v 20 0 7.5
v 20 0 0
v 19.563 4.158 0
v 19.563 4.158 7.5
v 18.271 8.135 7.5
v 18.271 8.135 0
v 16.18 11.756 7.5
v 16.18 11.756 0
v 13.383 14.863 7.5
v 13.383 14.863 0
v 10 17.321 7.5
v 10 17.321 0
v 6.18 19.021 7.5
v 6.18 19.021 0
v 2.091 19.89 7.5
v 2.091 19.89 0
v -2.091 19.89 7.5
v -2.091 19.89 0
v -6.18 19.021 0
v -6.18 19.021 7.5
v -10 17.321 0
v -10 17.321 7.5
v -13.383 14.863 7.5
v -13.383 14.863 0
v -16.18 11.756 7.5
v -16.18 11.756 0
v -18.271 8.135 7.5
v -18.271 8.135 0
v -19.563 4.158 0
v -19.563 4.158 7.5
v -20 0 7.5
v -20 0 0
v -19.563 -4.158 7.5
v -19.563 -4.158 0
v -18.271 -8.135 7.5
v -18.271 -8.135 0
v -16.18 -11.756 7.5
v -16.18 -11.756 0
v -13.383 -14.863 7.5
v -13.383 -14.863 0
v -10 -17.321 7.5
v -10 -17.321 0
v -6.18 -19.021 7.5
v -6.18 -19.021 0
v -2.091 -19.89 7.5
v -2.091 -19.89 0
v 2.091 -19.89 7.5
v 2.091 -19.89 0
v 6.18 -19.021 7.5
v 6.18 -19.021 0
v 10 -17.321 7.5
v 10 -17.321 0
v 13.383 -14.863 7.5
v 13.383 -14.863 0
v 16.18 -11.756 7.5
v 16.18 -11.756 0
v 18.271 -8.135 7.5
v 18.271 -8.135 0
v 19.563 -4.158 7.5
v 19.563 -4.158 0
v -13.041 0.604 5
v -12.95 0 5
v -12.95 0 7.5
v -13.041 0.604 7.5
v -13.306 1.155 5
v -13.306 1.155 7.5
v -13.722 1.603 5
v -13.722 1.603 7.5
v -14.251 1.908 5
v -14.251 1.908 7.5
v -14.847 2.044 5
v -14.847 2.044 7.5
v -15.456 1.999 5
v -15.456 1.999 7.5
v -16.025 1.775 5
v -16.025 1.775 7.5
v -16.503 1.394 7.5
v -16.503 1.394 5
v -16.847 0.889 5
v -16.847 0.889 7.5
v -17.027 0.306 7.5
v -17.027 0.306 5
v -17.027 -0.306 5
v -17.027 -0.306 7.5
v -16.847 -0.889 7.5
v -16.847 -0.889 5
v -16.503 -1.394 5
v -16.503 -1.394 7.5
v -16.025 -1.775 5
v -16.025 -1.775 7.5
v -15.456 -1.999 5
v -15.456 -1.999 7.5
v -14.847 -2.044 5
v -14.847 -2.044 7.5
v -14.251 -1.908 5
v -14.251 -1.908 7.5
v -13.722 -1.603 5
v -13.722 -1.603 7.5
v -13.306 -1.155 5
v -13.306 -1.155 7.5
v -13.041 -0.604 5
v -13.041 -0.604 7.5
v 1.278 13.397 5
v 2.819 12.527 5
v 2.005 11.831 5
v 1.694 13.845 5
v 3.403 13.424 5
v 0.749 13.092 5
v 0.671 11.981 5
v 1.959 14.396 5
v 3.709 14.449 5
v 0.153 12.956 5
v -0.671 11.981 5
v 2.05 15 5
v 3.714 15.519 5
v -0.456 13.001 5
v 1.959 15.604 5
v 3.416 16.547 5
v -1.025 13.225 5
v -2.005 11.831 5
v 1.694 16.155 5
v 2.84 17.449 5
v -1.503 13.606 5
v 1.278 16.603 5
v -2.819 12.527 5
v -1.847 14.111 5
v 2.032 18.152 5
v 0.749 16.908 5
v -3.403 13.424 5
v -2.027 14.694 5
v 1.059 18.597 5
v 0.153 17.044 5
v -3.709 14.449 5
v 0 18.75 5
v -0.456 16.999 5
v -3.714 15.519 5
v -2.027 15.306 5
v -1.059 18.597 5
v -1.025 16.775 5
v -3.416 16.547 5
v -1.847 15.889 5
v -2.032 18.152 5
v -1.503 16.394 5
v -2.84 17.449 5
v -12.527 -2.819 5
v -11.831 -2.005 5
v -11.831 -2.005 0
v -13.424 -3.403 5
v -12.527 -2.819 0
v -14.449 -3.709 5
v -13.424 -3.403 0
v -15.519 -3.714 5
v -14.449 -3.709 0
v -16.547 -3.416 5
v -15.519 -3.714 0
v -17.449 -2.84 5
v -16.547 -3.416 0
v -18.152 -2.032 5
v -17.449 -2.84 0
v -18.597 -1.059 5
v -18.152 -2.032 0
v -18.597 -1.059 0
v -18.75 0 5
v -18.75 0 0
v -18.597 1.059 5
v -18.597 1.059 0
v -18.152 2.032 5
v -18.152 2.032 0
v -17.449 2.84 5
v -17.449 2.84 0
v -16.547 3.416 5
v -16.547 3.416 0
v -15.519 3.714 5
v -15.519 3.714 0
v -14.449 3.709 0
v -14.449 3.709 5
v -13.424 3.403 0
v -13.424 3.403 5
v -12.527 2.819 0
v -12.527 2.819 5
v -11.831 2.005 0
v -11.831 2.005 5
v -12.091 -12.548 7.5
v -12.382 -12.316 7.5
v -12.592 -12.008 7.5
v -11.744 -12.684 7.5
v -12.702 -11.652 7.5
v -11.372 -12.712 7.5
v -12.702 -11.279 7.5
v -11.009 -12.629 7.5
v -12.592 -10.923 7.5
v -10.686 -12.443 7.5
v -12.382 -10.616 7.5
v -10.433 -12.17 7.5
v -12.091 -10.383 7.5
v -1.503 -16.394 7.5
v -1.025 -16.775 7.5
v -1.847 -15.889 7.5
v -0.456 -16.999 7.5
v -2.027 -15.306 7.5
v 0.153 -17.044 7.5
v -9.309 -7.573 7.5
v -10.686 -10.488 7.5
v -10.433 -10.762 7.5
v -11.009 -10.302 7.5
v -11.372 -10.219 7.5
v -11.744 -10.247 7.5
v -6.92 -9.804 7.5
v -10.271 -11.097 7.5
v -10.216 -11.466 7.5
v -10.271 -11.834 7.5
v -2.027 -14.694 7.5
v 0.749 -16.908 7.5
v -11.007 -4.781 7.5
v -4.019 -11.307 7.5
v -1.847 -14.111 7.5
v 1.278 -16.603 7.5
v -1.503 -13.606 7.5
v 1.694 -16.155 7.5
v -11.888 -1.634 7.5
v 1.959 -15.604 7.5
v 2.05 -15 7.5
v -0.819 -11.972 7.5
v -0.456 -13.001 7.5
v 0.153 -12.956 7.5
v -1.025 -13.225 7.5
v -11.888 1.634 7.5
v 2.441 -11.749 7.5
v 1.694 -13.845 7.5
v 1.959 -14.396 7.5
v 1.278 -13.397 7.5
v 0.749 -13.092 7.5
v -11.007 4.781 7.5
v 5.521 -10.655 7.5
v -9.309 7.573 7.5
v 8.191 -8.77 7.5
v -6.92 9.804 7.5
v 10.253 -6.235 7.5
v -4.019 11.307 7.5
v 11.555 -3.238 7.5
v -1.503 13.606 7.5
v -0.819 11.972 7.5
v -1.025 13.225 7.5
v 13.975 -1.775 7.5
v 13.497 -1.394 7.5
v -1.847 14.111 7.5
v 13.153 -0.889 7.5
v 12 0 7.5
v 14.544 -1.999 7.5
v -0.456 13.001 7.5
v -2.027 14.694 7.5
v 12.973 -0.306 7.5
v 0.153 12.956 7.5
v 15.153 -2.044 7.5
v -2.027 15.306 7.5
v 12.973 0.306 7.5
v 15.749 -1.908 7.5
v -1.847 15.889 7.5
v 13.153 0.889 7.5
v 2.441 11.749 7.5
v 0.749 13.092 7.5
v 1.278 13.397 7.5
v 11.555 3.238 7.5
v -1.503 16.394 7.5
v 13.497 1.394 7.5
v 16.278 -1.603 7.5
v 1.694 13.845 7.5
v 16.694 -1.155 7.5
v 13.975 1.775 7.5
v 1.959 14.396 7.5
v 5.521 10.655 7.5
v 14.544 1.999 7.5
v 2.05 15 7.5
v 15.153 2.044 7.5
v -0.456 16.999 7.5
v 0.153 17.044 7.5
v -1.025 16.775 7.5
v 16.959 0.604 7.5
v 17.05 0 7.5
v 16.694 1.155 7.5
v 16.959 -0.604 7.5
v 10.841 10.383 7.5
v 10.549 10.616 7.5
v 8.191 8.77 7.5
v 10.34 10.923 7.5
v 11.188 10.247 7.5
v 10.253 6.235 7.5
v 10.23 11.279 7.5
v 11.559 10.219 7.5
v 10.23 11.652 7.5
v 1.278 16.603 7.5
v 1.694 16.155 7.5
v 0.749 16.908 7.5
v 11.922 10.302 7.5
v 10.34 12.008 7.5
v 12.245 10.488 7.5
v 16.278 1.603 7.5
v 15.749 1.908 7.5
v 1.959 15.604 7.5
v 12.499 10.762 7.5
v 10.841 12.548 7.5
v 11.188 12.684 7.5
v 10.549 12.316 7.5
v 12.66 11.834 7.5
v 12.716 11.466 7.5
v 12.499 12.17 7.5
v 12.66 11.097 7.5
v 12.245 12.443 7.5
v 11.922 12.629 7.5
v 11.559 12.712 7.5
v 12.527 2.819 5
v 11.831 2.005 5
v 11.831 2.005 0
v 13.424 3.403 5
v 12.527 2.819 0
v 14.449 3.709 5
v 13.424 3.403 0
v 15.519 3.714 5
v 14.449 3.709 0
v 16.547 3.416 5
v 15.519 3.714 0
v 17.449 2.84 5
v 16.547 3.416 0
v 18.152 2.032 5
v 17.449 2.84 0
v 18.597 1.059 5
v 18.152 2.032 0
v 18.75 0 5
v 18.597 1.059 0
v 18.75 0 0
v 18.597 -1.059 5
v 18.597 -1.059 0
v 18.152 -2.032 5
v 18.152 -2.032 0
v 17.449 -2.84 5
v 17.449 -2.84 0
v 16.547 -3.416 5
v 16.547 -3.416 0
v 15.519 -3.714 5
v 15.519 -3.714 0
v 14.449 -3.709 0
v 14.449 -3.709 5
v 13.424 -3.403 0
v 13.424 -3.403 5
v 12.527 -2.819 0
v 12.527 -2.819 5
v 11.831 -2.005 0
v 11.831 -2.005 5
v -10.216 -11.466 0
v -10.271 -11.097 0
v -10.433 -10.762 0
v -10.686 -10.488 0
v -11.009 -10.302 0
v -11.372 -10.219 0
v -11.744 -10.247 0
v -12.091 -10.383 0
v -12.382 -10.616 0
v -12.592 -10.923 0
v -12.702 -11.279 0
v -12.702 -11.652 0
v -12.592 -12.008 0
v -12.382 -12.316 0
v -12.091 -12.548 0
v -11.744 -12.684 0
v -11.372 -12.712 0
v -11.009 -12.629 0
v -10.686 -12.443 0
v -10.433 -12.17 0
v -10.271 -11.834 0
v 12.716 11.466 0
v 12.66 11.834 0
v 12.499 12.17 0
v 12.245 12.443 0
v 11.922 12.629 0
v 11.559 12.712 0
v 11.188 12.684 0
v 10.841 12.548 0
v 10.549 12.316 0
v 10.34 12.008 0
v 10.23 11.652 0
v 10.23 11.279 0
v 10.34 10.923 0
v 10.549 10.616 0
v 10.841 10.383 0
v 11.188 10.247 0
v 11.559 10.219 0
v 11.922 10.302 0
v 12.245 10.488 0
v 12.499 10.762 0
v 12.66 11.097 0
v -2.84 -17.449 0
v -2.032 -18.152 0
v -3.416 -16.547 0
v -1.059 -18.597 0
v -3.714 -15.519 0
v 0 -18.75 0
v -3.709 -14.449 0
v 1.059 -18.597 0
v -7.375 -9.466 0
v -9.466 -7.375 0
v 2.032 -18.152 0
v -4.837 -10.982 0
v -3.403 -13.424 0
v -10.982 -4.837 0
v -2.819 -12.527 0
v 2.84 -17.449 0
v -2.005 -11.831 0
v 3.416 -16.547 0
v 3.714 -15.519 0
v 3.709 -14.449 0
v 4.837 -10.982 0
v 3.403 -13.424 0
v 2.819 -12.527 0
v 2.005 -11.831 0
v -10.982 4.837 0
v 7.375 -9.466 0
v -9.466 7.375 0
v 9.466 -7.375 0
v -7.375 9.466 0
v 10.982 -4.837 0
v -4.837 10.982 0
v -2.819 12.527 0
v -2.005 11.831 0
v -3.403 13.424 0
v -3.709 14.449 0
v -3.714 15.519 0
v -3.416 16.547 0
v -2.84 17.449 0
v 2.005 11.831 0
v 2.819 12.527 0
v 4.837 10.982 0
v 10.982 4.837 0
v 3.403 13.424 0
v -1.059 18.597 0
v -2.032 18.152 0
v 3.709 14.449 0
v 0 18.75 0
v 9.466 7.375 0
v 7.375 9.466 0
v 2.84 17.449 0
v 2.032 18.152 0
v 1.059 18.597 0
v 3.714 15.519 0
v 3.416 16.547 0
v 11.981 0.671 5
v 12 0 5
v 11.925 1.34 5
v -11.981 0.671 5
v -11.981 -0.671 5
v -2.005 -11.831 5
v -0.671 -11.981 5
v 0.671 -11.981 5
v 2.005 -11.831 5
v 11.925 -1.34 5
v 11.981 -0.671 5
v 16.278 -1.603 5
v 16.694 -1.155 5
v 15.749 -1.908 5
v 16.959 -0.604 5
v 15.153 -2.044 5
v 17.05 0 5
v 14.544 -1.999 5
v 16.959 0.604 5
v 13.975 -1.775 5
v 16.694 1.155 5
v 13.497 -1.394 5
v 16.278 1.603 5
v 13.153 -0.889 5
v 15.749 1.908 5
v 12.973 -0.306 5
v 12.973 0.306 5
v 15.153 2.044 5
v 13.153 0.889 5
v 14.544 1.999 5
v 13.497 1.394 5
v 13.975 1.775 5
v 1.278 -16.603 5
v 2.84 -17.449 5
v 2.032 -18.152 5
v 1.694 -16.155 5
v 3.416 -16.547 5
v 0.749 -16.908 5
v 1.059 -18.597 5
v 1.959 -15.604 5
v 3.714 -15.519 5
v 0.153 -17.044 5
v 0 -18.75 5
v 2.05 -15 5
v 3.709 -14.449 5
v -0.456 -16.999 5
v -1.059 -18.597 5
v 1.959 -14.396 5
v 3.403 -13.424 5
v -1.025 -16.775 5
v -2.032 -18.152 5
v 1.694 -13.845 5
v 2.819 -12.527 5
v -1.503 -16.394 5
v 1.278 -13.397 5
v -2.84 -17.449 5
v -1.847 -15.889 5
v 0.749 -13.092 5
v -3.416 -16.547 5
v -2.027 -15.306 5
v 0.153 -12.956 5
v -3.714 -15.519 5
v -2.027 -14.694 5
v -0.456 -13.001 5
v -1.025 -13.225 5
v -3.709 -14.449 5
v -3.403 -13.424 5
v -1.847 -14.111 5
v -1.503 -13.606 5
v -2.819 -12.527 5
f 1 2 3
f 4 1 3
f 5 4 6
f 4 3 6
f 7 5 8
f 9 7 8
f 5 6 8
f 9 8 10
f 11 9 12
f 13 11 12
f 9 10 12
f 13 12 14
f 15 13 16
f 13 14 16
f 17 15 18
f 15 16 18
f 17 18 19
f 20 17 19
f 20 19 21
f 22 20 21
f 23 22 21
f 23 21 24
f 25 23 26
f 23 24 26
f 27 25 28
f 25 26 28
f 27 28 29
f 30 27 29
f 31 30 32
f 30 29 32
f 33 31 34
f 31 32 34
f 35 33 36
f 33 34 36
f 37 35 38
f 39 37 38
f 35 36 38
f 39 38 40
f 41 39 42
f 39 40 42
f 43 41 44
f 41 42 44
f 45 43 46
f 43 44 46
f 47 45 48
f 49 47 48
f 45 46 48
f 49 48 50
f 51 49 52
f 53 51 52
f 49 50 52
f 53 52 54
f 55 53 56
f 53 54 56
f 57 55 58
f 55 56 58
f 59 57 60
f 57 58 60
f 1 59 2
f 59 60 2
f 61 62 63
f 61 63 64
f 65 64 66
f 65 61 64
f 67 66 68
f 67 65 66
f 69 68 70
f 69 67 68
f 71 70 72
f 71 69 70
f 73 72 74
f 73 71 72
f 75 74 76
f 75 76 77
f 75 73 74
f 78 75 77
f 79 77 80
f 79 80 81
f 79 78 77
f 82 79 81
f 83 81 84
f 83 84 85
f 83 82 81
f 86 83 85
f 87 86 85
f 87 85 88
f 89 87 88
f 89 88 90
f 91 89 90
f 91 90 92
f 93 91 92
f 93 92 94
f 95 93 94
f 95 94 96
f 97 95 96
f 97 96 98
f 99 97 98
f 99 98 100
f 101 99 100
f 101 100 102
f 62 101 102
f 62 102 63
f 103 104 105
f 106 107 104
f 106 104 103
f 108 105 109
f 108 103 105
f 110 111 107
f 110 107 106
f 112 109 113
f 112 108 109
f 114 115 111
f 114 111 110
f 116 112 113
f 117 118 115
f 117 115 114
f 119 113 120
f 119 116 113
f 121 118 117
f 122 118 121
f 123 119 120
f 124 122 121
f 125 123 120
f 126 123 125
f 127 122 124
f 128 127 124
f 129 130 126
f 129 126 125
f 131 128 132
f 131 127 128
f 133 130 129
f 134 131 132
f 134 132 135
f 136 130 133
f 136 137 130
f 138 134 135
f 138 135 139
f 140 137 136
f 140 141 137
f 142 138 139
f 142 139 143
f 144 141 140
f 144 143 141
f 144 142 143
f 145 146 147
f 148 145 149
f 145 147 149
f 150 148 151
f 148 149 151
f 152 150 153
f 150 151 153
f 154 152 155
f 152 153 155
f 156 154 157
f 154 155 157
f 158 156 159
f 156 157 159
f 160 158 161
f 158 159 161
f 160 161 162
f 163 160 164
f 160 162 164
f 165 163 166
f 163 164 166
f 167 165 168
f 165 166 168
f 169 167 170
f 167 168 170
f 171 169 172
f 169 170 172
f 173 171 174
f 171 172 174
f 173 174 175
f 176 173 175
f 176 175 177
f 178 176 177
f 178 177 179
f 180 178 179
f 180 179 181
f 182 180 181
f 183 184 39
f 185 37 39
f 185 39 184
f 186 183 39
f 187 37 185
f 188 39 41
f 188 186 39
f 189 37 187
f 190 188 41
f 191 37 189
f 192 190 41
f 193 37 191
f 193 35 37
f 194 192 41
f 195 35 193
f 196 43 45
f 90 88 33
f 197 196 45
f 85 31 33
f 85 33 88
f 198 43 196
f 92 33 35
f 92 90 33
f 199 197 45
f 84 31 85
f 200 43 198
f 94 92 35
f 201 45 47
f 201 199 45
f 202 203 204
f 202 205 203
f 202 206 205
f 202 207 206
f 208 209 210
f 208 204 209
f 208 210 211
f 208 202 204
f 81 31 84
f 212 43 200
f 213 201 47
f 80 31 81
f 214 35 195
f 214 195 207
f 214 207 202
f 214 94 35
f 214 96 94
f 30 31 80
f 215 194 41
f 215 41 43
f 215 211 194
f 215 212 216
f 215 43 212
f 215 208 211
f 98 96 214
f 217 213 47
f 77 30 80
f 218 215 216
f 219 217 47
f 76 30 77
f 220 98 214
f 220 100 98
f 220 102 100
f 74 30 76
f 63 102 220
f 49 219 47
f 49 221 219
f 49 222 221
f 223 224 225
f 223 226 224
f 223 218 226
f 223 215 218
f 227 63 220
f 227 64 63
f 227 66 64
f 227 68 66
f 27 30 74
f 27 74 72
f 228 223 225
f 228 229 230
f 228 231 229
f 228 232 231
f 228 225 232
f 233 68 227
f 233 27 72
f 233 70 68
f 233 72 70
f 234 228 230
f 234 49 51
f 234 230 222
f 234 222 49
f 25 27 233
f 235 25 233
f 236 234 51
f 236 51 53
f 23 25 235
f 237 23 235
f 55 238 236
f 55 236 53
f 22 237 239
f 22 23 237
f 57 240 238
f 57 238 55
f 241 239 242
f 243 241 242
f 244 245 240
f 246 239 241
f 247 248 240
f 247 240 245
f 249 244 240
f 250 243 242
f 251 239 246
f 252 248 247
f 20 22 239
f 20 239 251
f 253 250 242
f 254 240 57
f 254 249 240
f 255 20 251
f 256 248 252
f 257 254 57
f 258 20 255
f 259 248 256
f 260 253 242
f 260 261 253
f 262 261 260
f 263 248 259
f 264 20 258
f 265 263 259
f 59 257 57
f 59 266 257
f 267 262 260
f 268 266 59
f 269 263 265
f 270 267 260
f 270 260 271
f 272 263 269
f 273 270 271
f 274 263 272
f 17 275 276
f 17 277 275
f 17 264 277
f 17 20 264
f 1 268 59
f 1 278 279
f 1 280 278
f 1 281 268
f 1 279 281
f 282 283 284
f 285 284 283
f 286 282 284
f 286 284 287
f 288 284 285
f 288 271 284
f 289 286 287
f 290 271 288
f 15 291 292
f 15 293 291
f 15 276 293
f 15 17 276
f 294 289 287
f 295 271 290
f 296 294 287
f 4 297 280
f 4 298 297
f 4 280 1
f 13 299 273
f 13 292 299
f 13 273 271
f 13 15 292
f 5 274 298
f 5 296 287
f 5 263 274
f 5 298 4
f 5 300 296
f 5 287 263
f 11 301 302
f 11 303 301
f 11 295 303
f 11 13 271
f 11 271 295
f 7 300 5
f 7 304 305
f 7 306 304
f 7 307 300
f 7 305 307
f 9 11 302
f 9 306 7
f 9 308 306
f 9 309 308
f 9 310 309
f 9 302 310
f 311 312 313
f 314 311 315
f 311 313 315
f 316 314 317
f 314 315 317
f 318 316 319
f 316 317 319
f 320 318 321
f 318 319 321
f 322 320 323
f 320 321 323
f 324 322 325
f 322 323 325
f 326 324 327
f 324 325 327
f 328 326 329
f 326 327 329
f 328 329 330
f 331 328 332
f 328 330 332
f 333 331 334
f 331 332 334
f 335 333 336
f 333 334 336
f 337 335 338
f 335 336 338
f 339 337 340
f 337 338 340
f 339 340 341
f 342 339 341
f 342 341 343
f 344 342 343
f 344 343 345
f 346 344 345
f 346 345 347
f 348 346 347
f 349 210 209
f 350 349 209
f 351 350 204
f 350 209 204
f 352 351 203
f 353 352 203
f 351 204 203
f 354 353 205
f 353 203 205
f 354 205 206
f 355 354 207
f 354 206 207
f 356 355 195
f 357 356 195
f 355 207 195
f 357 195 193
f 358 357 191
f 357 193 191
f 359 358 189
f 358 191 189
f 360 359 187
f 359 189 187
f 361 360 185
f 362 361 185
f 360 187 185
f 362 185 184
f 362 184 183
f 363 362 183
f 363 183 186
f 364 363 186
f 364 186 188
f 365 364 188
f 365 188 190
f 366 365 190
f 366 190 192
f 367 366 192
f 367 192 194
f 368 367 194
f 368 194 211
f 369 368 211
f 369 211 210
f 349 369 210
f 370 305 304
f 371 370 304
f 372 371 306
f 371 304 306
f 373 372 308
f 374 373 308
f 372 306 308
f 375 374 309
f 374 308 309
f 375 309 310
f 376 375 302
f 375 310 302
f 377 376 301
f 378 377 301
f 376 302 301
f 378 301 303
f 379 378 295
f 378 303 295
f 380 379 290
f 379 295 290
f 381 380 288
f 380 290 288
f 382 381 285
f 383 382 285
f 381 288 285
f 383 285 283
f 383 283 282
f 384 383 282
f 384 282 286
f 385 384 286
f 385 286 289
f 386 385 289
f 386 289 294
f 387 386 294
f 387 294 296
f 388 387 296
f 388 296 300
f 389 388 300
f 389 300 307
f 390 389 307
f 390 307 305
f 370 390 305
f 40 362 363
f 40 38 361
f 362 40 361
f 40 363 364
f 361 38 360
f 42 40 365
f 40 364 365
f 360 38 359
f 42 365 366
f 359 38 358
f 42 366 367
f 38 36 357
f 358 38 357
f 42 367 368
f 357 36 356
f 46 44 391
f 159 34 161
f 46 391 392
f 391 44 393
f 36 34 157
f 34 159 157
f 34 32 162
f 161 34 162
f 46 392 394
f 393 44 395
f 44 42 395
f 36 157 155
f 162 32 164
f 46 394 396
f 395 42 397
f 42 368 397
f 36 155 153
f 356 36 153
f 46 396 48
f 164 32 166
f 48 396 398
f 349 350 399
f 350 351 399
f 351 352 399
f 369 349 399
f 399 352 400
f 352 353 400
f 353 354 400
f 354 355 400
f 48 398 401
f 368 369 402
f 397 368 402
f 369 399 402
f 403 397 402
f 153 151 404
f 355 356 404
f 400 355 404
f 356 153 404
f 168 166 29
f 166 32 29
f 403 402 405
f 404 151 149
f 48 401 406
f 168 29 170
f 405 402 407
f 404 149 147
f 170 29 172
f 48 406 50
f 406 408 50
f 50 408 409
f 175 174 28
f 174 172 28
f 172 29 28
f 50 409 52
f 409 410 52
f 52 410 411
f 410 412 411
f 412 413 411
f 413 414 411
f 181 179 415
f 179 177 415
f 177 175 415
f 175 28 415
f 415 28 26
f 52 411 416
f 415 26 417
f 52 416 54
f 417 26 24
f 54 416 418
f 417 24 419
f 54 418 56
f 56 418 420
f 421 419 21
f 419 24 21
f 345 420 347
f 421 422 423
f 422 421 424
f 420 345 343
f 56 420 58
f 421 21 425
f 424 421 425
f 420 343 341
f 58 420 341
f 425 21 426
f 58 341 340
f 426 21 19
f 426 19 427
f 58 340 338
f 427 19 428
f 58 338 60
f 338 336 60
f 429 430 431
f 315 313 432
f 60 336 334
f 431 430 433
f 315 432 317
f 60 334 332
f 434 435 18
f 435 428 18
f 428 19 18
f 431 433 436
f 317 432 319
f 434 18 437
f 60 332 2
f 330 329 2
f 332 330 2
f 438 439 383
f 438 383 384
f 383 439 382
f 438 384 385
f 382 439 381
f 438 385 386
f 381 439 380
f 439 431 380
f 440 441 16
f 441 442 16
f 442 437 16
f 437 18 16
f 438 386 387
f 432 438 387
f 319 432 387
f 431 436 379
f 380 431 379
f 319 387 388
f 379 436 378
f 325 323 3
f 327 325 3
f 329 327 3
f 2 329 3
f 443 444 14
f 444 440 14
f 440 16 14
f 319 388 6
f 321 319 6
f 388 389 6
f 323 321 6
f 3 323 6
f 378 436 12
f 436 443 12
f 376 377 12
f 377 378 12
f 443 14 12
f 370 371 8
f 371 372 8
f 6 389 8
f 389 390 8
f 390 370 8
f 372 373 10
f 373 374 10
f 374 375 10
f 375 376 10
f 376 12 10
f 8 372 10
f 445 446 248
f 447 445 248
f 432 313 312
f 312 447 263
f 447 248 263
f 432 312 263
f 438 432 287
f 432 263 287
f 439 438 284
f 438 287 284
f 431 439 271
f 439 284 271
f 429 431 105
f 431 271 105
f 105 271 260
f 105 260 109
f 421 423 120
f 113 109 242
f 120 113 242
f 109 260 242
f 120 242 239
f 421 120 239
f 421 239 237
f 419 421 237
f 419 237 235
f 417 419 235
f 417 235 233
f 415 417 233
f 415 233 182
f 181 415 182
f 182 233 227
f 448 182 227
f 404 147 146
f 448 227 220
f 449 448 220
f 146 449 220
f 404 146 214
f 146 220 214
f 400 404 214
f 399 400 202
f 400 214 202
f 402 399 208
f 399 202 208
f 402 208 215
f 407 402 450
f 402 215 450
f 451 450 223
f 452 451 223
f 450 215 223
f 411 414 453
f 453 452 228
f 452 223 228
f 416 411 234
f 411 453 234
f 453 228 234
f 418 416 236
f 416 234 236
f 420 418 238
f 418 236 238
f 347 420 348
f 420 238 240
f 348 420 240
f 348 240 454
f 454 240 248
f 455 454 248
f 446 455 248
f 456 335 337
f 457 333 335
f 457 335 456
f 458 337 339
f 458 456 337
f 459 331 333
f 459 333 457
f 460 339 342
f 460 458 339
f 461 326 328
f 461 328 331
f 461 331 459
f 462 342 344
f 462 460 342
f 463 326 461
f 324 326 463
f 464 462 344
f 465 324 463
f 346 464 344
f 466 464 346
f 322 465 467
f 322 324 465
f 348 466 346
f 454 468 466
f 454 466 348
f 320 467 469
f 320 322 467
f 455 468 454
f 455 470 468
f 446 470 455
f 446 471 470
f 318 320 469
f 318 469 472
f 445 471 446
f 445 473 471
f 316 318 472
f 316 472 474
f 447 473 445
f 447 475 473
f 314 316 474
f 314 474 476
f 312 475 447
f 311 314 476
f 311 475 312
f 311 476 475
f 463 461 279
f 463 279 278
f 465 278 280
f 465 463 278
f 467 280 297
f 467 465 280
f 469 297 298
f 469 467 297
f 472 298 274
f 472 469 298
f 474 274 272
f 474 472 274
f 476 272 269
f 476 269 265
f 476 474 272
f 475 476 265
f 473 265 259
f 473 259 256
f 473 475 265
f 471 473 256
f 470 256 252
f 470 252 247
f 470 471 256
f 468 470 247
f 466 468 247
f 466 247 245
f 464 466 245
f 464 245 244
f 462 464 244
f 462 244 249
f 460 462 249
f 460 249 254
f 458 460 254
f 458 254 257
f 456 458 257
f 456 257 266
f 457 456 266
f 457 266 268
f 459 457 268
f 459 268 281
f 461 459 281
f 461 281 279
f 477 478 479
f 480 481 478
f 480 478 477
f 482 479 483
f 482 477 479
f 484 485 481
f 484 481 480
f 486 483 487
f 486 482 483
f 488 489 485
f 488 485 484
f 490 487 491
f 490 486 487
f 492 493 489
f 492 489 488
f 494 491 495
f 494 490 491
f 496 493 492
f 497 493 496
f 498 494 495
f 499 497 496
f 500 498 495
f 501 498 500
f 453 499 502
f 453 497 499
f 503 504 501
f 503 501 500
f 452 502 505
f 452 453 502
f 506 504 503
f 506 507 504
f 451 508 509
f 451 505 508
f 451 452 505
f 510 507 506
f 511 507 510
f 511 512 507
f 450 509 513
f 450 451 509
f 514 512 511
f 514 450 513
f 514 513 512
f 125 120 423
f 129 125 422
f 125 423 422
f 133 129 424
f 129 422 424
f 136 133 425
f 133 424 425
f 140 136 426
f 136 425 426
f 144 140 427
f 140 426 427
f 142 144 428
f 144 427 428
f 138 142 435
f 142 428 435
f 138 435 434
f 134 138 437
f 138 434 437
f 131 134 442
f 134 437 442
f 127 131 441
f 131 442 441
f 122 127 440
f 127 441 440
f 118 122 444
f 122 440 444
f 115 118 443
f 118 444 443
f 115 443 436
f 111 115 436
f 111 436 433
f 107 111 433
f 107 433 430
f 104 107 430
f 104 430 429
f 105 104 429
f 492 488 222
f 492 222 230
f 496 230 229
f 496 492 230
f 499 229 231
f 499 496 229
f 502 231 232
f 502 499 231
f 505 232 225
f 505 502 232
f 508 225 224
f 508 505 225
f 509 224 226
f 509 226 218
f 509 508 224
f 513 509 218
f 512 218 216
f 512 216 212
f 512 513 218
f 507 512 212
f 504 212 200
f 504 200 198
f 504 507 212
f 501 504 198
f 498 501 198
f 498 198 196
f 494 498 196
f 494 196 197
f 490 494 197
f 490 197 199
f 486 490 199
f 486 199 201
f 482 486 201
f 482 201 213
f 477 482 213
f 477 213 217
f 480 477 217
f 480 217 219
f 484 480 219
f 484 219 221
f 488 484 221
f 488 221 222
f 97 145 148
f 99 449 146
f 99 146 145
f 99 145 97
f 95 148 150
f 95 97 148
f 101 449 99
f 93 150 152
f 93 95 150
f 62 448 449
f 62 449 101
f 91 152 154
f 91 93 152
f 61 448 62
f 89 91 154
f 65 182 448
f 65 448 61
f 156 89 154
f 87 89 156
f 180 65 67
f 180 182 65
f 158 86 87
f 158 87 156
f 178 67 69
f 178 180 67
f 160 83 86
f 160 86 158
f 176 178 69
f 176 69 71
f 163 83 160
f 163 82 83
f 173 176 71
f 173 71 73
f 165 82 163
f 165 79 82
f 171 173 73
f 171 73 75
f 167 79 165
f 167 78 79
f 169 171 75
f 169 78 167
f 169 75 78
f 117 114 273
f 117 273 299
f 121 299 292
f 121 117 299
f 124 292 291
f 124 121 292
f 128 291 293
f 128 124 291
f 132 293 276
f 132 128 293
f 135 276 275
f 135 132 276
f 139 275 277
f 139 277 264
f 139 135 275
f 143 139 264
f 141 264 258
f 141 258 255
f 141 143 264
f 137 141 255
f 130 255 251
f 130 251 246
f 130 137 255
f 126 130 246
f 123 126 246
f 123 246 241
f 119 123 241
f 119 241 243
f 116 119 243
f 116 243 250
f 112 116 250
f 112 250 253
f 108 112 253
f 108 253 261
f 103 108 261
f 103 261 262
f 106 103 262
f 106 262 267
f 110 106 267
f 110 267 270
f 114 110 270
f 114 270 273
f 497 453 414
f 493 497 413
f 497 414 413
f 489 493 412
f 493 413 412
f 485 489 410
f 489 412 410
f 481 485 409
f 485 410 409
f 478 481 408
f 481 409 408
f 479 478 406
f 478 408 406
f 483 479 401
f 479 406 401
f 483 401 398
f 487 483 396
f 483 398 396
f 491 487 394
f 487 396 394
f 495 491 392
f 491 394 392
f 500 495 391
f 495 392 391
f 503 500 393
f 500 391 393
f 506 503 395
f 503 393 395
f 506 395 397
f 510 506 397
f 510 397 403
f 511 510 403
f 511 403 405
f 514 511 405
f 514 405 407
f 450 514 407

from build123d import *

# Parameters (mm, degrees)
SKETCH_1_R          = 20
SKETCH_1_R_2        = 2.05
EXTRUDE_1_DEPTH     = 7.5
SKETCH_2_R          = 1.25
SKETCH_2_R_2        = 12
CUT_EXTRUDE_1_DEPTH = 8.5
SKETCH_4_R          = 3.75
CUT_EXTRUDE_3_DEPTH = 5


with BuildPart() as part:
    # ｽｹｯﾁ1 → ﾎﾞｽ - 押し出し1 (new body)
    with BuildSketch(Plane.XY):
        Circle(SKETCH_1_R)
        with Locations((0, 15)):
            Circle(SKETCH_1_R_2, mode=Mode.SUBTRACT)
        with Locations((15, 0)):
            Circle(SKETCH_1_R_2, mode=Mode.SUBTRACT)
        with Locations((0, -15)):
            Circle(SKETCH_1_R_2, mode=Mode.SUBTRACT)
        with Locations((-15, 0)):
            Circle(SKETCH_1_R_2, mode=Mode.SUBTRACT)
    extrude(amount=EXTRUDE_1_DEPTH)

    # ｽｹｯﾁ2 → ｶｯﾄ - 押し出し1 (cut, through all)
    with BuildSketch(Plane.XY.offset(7.5)):
        with Locations((11.465736457, 11.465736457)):
            Circle(SKETCH_2_R)
        with Locations((-11.465736457, -11.465736457)):
            Circle(SKETCH_2_R)
        Circle(SKETCH_2_R_2)
    extrude(amount=-CUT_EXTRUDE_1_DEPTH, mode=Mode.SUBTRACT)

    # ｽｹｯﾁ4 → ｶｯﾄ - 押し出し3 (cut)
    with BuildSketch(Plane(origin=(0, 0, 0), x_dir=(-1, 0, 0), z_dir=(0, 0, -1))):
        with Locations((0, 15)):
            Circle(SKETCH_4_R)
        with Locations((15, 0)):
            Circle(SKETCH_4_R)
        with Locations((0, -15)):
            Circle(SKETCH_4_R)
        with Locations((-15, 0)):
            Circle(SKETCH_4_R)
    extrude(amount=-CUT_EXTRUDE_3_DEPTH, mode=Mode.SUBTRACT)


solid = part.part
